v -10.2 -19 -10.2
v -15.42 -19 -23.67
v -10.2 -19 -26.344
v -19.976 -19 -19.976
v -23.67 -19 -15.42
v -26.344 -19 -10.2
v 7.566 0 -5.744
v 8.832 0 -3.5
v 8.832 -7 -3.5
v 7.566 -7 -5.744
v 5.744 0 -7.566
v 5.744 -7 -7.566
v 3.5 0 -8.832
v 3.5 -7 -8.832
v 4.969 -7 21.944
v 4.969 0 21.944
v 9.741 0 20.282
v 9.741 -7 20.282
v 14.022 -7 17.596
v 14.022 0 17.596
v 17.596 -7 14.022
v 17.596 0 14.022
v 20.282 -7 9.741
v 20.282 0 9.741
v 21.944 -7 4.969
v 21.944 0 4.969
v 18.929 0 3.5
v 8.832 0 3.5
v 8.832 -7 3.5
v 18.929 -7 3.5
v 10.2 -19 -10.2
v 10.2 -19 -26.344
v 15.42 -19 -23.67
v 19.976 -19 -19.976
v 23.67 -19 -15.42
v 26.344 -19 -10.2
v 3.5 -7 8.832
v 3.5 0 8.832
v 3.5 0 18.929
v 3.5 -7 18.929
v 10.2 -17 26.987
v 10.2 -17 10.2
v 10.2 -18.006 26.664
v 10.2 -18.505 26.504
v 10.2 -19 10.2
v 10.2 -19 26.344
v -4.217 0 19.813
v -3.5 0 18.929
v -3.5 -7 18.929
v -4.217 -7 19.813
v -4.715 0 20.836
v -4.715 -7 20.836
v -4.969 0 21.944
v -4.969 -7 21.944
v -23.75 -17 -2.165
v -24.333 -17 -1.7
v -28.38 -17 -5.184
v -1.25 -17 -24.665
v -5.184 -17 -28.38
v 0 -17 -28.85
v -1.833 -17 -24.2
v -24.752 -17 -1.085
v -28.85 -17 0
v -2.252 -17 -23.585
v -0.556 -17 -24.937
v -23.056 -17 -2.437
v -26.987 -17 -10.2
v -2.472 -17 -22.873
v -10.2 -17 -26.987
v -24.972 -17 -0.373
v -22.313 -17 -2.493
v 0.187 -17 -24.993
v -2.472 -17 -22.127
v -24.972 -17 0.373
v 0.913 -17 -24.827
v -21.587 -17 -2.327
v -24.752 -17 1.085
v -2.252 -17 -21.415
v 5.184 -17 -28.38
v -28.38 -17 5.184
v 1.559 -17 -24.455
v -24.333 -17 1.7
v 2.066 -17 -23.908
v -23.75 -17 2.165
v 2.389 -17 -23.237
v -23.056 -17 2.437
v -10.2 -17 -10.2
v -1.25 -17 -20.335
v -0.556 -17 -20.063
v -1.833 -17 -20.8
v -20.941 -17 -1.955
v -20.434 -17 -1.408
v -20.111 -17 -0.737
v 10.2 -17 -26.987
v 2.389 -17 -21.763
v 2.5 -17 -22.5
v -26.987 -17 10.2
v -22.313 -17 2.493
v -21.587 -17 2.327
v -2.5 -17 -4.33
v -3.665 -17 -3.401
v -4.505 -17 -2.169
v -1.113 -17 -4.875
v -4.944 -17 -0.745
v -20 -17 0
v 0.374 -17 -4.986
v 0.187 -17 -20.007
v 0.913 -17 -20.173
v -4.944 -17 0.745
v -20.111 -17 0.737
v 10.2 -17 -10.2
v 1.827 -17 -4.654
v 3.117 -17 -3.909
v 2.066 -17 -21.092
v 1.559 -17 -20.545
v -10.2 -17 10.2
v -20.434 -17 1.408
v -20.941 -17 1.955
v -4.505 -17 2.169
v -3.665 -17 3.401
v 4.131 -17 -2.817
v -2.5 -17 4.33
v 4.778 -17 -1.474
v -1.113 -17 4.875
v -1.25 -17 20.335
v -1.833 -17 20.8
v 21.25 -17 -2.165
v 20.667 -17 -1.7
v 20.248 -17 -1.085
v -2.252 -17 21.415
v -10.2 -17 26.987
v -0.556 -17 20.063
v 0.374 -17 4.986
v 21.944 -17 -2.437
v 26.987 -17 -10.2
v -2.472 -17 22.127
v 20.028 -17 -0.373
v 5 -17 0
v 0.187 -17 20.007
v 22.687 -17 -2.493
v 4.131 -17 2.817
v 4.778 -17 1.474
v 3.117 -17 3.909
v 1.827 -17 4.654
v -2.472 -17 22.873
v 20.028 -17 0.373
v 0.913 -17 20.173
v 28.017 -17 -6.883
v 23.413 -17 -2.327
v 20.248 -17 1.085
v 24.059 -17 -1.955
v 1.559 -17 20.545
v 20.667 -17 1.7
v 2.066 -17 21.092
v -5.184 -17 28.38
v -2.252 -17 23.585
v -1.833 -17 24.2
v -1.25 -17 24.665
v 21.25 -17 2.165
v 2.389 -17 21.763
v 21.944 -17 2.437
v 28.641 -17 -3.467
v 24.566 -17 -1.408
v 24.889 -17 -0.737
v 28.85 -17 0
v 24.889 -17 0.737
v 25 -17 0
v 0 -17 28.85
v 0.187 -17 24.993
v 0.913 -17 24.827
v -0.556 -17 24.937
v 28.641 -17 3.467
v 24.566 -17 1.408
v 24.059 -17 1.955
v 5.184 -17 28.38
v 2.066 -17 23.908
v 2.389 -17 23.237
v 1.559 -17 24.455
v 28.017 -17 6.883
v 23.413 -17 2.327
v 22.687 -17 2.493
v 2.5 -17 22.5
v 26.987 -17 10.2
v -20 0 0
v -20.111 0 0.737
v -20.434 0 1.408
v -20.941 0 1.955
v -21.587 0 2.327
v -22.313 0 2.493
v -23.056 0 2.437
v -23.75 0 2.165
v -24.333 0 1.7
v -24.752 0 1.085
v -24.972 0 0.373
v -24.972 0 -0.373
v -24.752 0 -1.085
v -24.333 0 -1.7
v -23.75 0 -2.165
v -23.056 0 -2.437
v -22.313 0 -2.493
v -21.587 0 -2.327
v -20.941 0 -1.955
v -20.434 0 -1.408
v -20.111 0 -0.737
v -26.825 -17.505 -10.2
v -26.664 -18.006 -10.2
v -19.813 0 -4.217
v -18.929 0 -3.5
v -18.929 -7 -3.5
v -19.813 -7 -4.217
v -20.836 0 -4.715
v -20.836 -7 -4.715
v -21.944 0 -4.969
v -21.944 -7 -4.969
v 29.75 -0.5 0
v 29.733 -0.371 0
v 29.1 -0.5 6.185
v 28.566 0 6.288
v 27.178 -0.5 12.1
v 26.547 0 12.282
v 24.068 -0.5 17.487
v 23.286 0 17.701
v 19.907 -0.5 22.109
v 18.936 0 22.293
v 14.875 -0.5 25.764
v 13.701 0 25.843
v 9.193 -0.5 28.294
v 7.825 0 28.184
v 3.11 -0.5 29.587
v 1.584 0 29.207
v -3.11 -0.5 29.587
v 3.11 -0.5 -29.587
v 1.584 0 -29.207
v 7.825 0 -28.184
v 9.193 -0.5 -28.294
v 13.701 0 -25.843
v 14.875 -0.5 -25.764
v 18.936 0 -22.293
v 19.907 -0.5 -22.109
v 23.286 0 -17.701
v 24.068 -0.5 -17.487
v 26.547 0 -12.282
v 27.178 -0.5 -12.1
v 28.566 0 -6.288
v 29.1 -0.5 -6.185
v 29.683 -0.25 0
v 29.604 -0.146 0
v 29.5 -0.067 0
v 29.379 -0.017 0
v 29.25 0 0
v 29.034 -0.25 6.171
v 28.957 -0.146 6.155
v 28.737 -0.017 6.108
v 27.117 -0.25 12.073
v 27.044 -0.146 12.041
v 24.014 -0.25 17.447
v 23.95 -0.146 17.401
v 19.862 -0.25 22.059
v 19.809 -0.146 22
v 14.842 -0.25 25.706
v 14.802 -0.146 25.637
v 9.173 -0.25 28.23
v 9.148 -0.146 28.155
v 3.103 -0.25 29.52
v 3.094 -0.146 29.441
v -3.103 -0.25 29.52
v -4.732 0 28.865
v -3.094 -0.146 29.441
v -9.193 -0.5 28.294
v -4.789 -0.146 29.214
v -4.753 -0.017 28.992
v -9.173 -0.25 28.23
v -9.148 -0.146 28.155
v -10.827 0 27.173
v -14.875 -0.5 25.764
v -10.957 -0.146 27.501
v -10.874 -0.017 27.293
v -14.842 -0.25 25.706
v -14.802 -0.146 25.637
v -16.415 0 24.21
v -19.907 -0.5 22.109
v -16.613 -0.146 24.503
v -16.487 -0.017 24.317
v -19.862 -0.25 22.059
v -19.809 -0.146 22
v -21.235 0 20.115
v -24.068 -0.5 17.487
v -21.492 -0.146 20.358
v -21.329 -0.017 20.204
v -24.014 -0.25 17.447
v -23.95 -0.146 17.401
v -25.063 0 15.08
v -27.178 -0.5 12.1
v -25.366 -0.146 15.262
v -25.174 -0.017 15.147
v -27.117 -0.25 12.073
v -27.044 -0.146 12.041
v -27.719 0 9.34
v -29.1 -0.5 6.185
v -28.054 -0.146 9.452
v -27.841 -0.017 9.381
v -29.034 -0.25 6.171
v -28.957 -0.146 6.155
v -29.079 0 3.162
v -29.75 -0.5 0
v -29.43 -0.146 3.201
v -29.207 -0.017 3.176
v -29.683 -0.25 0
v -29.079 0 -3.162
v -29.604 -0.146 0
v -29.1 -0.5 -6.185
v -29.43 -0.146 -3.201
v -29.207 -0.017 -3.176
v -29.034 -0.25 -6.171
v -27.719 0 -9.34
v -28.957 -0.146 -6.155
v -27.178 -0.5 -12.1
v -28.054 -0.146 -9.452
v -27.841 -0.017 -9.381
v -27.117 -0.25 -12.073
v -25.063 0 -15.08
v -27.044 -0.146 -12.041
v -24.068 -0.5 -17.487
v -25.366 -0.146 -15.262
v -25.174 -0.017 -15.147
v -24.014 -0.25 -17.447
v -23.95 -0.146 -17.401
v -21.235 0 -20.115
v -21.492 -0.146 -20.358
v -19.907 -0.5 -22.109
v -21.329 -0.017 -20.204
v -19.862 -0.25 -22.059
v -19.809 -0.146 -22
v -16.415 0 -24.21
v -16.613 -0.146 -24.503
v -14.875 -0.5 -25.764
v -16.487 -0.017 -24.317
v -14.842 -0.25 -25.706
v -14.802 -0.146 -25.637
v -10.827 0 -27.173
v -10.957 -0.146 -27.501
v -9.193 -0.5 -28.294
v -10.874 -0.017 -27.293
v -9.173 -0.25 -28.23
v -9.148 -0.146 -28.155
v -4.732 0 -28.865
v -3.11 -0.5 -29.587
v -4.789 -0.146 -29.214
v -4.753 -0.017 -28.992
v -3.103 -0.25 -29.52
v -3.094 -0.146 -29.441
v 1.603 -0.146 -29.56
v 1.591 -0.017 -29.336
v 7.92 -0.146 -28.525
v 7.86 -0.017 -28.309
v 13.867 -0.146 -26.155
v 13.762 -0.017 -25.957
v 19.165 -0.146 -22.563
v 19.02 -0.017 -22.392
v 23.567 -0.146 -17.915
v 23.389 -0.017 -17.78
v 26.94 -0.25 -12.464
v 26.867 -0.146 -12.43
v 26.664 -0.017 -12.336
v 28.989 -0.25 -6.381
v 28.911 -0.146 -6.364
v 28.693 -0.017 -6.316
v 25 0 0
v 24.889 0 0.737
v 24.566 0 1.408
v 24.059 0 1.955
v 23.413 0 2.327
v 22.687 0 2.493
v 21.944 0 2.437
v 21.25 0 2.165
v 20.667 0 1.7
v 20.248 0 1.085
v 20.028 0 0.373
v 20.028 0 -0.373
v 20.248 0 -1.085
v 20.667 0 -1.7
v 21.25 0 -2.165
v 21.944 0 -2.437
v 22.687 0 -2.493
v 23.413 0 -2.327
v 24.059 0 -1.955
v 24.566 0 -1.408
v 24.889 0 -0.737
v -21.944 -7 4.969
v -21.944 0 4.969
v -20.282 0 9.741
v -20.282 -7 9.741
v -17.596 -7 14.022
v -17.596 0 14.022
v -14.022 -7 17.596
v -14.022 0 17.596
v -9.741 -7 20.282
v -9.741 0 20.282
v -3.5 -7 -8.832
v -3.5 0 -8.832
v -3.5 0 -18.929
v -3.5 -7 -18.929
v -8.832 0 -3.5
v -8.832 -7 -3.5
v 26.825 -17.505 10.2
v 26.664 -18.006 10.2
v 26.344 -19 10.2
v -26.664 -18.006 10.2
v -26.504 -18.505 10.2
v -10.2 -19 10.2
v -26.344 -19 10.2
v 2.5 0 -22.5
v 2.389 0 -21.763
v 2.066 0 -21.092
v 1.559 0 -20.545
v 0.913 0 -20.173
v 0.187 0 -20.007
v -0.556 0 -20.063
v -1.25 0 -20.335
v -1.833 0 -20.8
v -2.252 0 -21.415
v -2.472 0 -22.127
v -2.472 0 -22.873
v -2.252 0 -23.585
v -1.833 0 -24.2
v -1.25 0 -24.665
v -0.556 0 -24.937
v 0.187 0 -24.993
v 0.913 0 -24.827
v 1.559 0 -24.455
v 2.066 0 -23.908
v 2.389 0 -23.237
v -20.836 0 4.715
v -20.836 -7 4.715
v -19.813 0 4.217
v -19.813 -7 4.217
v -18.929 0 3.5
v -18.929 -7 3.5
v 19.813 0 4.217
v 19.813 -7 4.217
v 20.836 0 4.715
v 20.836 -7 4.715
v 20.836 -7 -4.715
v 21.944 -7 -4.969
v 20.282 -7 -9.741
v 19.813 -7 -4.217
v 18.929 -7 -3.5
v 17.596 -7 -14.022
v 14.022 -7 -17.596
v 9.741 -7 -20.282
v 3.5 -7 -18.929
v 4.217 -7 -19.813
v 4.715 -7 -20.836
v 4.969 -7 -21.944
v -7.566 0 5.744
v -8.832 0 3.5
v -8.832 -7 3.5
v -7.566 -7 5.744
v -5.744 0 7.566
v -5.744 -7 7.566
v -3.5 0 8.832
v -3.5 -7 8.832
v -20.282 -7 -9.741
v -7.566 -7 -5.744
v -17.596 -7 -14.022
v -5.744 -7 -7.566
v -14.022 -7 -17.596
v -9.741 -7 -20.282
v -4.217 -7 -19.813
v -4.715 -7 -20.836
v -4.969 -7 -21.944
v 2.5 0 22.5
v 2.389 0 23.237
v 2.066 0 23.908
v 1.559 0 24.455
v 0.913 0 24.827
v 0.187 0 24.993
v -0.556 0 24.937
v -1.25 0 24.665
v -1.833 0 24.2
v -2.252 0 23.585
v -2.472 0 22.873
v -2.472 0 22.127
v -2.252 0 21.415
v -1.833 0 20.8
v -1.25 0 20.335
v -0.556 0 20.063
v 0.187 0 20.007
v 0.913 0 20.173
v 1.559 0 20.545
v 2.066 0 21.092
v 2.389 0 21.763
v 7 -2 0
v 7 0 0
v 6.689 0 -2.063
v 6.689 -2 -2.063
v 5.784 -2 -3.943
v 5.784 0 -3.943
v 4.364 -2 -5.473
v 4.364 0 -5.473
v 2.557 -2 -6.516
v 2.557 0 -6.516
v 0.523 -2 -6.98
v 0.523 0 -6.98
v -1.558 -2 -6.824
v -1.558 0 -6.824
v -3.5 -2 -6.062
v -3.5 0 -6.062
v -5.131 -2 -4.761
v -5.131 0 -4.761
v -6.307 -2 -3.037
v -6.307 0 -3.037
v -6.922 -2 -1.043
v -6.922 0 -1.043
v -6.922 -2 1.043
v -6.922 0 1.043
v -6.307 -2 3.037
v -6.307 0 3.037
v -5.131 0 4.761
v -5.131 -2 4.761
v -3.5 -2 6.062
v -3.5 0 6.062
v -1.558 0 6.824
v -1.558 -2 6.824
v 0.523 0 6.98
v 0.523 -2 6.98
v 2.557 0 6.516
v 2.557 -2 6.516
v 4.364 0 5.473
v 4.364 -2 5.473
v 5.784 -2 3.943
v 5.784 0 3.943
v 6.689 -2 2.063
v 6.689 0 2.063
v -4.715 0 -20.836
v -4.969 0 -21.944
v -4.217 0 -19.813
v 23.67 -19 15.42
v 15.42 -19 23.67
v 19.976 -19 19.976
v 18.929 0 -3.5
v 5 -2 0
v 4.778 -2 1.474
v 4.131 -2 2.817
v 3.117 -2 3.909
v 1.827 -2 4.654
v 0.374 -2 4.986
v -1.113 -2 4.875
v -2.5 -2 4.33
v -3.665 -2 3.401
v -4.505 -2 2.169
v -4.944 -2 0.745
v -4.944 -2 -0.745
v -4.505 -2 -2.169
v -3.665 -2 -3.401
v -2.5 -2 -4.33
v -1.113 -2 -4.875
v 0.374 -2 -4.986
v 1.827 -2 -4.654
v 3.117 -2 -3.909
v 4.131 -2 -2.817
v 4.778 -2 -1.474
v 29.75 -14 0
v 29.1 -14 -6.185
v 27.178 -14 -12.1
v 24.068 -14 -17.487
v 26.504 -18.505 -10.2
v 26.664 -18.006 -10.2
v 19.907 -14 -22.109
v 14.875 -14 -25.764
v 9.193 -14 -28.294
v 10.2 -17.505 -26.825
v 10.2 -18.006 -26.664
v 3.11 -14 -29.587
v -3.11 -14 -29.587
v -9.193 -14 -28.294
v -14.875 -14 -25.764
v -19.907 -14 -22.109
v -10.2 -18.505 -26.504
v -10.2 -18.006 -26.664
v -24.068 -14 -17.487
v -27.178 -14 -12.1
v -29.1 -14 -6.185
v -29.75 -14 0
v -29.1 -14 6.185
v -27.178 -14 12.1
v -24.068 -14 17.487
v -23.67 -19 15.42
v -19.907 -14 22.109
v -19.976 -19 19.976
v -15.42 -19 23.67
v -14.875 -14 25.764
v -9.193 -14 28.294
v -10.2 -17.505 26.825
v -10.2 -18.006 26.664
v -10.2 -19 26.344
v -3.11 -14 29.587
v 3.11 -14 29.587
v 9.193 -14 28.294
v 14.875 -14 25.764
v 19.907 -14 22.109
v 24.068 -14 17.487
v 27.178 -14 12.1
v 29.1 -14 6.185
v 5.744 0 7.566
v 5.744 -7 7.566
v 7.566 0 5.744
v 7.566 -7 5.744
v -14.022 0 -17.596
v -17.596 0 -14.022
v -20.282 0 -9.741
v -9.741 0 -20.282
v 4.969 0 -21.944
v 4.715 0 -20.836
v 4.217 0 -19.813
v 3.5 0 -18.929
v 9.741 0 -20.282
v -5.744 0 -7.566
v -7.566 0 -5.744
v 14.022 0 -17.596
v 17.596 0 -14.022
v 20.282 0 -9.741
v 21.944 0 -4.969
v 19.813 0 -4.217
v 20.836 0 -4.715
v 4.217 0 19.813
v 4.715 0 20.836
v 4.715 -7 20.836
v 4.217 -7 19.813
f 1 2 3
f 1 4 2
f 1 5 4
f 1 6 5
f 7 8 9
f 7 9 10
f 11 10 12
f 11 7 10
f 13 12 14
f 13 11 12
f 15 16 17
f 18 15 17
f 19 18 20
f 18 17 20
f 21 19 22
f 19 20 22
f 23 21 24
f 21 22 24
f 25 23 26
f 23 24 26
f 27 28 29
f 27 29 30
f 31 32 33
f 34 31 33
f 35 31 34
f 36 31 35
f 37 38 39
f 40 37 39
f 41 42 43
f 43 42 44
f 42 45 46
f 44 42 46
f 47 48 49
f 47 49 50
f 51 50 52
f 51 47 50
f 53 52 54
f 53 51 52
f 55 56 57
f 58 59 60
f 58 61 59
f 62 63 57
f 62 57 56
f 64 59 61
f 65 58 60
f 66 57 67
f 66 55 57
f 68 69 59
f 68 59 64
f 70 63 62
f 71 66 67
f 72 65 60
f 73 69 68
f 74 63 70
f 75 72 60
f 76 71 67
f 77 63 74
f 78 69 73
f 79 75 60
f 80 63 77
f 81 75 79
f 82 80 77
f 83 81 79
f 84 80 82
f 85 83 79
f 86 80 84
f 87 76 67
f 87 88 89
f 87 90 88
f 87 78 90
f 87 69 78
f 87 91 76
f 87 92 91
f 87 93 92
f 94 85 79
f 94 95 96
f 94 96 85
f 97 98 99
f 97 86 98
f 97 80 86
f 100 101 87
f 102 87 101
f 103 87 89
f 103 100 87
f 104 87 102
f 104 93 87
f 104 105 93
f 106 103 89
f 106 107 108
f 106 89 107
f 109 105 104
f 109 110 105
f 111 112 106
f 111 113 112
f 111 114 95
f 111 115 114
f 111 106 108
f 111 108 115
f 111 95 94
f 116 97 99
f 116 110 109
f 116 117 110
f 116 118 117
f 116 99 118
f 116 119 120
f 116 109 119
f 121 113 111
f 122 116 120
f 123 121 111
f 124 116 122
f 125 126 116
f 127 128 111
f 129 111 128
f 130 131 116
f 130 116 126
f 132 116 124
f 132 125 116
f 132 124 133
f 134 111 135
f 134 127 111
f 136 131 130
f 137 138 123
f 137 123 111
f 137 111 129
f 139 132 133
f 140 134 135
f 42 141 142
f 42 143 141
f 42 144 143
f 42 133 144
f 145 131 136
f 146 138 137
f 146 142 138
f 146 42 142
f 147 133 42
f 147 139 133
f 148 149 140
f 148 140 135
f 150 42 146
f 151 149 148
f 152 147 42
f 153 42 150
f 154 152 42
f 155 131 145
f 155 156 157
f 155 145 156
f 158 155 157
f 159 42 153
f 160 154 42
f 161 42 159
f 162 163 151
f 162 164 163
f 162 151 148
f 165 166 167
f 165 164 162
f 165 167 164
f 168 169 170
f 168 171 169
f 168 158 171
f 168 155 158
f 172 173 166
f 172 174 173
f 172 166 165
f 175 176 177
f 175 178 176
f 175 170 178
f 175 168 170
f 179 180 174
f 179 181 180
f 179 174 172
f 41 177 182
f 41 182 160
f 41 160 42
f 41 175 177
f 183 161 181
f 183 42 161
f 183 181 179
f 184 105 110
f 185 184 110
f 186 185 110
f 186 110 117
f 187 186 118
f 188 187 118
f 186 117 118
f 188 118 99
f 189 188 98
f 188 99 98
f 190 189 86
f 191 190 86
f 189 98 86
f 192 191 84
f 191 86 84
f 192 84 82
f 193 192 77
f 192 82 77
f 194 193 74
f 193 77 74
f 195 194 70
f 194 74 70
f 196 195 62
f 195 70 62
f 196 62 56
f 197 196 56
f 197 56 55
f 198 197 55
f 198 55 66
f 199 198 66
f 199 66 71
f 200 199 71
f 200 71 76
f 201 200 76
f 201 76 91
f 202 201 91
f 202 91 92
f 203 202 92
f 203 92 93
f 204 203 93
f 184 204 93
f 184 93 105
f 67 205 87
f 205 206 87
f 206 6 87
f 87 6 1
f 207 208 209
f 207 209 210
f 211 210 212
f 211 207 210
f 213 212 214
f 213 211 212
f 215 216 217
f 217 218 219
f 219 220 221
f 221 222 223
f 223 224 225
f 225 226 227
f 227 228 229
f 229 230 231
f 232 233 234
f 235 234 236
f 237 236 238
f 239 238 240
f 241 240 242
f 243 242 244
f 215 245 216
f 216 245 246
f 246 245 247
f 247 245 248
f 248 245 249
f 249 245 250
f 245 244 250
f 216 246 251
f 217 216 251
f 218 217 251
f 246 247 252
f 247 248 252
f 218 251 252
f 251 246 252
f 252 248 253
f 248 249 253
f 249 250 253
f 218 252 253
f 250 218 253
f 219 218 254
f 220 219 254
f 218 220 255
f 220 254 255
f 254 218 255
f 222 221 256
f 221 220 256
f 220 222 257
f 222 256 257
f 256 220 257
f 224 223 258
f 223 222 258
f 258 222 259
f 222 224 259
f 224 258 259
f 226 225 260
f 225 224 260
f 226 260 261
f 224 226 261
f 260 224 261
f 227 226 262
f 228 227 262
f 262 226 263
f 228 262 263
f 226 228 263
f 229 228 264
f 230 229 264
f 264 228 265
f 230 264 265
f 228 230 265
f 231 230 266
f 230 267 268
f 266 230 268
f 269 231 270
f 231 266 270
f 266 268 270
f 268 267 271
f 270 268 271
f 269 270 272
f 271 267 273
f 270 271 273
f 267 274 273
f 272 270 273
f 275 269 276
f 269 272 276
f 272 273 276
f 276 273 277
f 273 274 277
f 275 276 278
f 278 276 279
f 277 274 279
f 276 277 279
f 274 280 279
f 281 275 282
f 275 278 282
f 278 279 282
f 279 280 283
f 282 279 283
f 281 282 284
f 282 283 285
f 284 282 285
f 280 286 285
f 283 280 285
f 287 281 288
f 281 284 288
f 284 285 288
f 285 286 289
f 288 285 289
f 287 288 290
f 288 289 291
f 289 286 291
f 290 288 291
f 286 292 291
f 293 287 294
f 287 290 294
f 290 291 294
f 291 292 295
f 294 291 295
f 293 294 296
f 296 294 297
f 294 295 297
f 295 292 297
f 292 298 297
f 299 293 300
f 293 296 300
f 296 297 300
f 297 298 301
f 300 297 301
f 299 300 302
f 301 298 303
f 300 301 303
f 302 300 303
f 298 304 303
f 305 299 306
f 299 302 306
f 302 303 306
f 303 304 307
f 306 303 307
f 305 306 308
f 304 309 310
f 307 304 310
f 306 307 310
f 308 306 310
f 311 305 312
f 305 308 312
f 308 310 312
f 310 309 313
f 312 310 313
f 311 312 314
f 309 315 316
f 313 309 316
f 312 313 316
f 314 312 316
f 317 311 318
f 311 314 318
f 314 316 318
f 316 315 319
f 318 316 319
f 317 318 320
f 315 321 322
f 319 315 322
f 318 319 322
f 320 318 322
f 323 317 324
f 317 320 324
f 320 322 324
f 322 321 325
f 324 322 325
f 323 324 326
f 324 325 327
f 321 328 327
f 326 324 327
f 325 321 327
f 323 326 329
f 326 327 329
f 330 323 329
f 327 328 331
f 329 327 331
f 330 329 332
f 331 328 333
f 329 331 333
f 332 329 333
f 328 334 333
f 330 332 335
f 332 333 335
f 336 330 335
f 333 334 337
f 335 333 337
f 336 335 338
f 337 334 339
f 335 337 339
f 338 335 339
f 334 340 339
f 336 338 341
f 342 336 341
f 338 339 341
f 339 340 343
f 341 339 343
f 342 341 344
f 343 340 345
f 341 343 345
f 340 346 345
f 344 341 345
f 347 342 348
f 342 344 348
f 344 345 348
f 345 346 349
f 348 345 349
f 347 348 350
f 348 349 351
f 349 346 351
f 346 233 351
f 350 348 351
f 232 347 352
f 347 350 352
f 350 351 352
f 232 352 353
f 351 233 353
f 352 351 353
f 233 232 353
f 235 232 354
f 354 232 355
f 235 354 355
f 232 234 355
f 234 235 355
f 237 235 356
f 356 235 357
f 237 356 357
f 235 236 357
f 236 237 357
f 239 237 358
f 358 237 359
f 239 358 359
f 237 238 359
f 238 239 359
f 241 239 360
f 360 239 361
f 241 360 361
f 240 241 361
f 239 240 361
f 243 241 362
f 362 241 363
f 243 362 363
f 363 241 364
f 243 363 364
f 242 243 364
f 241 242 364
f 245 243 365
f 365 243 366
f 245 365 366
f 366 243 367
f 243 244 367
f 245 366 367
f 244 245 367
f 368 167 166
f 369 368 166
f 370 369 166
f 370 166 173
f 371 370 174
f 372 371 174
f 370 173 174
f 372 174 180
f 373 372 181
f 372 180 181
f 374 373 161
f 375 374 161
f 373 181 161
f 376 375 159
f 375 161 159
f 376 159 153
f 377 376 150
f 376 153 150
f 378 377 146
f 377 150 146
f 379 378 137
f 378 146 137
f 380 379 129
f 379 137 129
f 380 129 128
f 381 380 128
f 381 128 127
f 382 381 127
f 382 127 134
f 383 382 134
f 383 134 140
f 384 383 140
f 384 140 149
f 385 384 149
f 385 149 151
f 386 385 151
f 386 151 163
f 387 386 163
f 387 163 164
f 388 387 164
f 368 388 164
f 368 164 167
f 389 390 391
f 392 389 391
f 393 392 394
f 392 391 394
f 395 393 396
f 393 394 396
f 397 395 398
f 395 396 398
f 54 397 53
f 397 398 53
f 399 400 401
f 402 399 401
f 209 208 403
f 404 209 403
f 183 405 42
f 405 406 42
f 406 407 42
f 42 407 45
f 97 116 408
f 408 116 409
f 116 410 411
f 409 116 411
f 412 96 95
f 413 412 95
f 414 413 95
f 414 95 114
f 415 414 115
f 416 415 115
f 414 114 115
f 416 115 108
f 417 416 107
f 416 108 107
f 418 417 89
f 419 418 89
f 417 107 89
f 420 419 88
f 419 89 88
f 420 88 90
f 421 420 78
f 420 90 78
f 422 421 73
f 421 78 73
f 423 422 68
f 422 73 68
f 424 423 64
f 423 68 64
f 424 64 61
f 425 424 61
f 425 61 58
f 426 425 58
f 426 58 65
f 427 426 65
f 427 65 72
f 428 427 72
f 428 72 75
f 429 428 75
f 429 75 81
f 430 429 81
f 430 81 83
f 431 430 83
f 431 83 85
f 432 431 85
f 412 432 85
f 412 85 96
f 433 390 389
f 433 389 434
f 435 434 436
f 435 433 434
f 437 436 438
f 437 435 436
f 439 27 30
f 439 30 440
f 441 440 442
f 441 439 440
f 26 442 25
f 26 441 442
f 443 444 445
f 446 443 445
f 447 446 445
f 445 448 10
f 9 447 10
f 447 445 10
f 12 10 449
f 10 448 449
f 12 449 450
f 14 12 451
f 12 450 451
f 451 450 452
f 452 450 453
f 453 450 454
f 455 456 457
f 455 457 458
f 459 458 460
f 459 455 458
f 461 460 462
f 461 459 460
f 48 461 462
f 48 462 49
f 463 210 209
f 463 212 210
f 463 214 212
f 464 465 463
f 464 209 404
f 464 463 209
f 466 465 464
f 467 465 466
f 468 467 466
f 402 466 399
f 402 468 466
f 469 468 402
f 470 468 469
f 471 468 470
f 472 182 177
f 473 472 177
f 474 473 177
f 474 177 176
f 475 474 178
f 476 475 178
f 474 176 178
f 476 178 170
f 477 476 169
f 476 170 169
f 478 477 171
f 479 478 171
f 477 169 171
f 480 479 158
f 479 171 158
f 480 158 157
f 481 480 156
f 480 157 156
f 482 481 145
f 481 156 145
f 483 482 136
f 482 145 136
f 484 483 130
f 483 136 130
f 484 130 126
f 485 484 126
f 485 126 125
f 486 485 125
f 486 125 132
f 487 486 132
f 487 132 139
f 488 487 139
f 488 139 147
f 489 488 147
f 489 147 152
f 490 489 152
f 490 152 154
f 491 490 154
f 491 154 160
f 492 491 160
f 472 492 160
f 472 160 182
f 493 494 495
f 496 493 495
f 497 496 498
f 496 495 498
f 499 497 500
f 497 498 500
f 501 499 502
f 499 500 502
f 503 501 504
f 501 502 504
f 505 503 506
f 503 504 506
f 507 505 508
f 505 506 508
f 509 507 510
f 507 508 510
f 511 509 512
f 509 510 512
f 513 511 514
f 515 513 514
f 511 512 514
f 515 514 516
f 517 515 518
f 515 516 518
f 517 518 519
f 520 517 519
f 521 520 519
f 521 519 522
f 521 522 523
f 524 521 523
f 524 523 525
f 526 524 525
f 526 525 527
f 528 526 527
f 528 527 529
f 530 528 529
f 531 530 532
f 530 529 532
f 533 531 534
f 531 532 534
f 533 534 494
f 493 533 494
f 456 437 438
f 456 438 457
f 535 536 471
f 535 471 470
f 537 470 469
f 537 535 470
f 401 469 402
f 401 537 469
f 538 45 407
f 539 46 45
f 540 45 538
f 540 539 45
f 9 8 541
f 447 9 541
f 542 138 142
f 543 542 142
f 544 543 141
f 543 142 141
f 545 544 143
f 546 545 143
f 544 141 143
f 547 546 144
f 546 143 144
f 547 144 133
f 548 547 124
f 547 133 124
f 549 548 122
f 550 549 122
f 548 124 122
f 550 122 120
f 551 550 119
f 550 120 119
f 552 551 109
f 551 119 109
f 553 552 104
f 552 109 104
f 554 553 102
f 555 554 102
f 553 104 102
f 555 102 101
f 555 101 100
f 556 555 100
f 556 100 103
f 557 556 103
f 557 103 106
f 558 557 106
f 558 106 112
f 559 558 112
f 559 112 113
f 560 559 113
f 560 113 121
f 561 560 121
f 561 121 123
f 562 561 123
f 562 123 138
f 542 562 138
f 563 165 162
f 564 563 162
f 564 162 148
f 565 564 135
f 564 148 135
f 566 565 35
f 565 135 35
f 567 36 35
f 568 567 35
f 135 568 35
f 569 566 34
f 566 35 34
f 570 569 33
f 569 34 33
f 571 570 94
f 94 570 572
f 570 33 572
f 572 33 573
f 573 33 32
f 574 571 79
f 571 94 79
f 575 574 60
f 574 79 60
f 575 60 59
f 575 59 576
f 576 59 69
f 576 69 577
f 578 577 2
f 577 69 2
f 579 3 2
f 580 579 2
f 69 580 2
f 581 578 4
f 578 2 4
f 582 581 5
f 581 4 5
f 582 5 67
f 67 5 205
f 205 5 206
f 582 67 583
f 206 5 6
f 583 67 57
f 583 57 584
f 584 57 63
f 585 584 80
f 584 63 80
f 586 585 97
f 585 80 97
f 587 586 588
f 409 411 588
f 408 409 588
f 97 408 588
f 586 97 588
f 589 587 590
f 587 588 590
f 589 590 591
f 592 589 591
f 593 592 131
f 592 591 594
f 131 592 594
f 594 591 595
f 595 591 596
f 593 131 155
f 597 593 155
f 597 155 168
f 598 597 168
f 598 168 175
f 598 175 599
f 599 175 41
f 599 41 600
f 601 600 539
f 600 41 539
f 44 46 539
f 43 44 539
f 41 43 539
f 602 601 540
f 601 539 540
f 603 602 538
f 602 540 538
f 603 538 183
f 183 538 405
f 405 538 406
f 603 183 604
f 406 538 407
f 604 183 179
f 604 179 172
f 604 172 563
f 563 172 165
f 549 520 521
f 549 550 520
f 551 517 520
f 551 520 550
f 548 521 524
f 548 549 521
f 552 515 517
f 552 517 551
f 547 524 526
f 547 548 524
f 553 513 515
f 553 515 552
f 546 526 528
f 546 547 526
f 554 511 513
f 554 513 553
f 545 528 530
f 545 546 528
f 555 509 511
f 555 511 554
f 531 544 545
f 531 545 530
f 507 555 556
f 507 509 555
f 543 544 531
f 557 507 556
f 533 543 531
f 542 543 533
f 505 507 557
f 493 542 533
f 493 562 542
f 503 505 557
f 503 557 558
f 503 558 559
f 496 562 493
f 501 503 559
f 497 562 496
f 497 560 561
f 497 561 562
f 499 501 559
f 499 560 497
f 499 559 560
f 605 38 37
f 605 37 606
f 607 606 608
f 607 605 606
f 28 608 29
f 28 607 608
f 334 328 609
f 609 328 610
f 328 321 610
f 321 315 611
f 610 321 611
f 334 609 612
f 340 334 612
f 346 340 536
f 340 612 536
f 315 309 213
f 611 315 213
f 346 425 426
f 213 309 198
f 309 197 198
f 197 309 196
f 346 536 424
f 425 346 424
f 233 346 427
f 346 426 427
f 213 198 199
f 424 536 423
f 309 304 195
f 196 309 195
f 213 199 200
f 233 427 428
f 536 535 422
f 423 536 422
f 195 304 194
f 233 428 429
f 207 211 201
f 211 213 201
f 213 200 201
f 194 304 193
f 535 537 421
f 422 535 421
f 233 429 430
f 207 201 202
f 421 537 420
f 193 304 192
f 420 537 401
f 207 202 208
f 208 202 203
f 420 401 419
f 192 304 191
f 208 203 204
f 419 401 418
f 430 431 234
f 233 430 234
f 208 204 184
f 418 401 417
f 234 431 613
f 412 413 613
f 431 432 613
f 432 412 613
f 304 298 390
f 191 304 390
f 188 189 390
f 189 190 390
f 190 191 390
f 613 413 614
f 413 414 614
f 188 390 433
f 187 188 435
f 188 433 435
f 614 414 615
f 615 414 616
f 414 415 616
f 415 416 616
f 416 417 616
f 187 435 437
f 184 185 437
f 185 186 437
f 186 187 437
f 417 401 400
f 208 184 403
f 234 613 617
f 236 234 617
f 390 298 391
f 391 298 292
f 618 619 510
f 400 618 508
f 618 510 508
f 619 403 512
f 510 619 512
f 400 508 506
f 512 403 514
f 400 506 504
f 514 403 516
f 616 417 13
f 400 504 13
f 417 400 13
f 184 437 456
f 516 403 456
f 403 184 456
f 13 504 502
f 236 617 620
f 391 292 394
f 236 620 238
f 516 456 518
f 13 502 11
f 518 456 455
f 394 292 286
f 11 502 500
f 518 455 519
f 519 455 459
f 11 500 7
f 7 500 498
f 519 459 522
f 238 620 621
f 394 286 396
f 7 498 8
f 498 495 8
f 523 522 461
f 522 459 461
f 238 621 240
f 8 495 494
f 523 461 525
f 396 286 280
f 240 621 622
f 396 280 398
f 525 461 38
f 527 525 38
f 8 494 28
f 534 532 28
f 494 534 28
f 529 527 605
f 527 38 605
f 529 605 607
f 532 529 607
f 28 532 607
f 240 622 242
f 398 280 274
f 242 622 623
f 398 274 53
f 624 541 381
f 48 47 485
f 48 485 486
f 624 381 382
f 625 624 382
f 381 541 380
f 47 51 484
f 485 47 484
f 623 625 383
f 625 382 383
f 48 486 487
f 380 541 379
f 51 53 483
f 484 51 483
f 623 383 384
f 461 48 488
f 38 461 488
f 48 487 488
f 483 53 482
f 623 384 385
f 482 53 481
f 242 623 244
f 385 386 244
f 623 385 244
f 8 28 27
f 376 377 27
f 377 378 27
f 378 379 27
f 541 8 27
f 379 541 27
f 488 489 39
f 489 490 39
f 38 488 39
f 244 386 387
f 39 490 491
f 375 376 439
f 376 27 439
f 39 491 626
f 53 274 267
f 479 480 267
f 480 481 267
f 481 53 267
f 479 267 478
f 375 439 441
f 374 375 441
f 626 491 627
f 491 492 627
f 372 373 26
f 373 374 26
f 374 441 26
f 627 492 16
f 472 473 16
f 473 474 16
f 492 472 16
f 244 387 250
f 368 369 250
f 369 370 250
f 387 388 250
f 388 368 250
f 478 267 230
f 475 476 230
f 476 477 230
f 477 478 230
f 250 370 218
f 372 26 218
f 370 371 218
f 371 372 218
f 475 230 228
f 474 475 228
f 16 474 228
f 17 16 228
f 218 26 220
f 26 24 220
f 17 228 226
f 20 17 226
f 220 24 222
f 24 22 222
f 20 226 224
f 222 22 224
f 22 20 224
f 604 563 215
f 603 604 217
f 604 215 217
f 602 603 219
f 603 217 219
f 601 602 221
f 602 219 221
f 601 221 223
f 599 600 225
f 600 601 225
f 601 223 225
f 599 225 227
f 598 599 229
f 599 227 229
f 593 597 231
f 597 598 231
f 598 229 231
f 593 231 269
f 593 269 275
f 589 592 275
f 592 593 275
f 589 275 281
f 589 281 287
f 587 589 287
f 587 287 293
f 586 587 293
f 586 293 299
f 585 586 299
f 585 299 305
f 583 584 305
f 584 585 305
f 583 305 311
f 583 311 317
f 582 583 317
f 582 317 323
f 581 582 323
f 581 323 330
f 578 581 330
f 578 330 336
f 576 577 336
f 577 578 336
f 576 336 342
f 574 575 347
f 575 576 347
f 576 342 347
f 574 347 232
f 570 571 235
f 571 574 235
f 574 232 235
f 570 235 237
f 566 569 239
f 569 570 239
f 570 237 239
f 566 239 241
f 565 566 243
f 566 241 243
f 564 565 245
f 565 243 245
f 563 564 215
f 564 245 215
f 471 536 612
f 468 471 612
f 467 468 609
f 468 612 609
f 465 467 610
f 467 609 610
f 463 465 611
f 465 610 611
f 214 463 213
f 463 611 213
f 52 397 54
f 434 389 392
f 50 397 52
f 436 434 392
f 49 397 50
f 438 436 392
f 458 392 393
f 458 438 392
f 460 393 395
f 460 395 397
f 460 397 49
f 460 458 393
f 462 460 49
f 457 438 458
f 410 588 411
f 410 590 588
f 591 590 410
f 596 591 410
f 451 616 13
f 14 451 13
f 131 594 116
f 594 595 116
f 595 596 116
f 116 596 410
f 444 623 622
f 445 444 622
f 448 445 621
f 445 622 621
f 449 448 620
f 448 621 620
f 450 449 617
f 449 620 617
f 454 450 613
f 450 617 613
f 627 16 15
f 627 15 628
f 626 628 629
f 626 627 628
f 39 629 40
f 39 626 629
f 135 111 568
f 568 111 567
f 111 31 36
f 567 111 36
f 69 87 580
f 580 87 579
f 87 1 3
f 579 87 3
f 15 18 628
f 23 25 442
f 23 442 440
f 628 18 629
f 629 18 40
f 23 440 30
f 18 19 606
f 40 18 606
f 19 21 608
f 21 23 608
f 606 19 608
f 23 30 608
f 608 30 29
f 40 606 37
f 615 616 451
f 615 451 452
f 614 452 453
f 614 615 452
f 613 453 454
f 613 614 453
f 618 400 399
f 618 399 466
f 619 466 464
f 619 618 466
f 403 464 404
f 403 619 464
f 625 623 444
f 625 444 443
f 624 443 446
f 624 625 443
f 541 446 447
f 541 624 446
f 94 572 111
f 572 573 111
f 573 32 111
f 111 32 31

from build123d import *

# Parameters (mm, degrees)
SKETCH_R        = 29.75
PAD_DEPTH       = 19
POCKET_DEPTH    = 2
SKETCH002_R     = 5
HOLE_DEPTH      = 17.001
SKETCH003_R     = 2.5
HOLE001_DEPTH   = 17.001
POCKET001_DEPTH = 7
SKETCH005_R     = 7
POCKET002_DEPTH = 2
FILLET_R        = 0.5


with BuildPart() as part:
    # Sketch → Pad (new body)
    with BuildSketch(Plane.XZ):
        Circle(SKETCH_R)
    extrude(amount=PAD_DEPTH)

    # Sketch001 (on Face3 of Pad) → Pocket (cut)
    with BuildSketch(Plane.XZ.offset(19)):
        Polygon((-10.2, 27.94678), (-10.2, 10.2), (-27.94678, 10.2), (-38.800591, 2.809986), (-27.94678, -10.2), (-10.2, -10.2), (-10.2, -27.94678), (0.437611, -41.292454), (10.2, -27.94678), (10.2, -10.2), (27.94678, -10.2), (40.756752, -1.838068), (27.94678, 10.2), (10.2, 10.2), (10.2, 27.94678), (-0.319049, 40.318684), align=None)
    extrude(amount=-POCKET_DEPTH, mode=Mode.SUBTRACT)

    # Sketch002 (on Face3 of Pocket) → Hole (cut, through all)
    with BuildSketch(Plane.XZ.offset(17)):
        Circle(SKETCH002_R)
    extrude(amount=-HOLE_DEPTH, mode=Mode.SUBTRACT)

    # Sketch003 (on Face3 of Hole) → Hole001 (cut, through all)
    with BuildSketch(Plane.XZ.offset(17)):
        with Locations((0, 22.5)):
            Circle(SKETCH003_R)
        with Locations((22.5, 0)):
            Circle(SKETCH003_R)
        with Locations((0, -22.5)):
            Circle(SKETCH003_R)
        with Locations((-22.5, 0)):
            Circle(SKETCH003_R)
    extrude(amount=-HOLE001_DEPTH, mode=Mode.SUBTRACT)

    # Sketch004 (on Face2 of Hole001) → Pocket001 (cut)
    with BuildSketch(Plane(origin=(0, 0, 0), x_dir=(1, 0, 0), z_dir=(0, 1, 0))):
        with BuildLine():
            ThreePointArc((-21.944444, -4.96904), (-15.909903, -15.909903), (-4.96904, -21.944444))
            ThreePointArc((-3.5, -18.929286), (-4.494881, -20.310013), (-4.96904, -21.944444))
            Line((-3.5, -8.831761), (-3.5, -18.929286))
            ThreePointArc((-8.831761, -3.5), (-6.717514, -6.717514), (-3.5, -8.831761))
            Line((-18.929286, -3.5), (-8.831761, -3.5))
            ThreePointArc((-21.944444, -4.96904), (-20.310013, -4.494881), (-18.929286, -3.5))
        make_face()
        with BuildLine():
            ThreePointArc((8.831761, 3.5), (6.717514, 6.717514), (3.5, 8.831761))
            Line((3.5, 18.929286), (3.5, 8.831761))
            ThreePointArc((3.5, 18.929286), (4.494881, 20.310013), (4.96904, 21.944444))
            ThreePointArc((21.944444, 4.96904), (15.909903, 15.909903), (4.96904, 21.944444))
            ThreePointArc((21.944444, 4.96904), (20.310013, 4.494881), (18.929286, 3.5))
            Line((8.831761, 3.5), (18.929286, 3.5))
        make_face()
        with BuildLine():
            ThreePointArc((18.929286, -3.5), (20.310013, -4.494881), (21.944444, -4.96904))
            ThreePointArc((4.96904, -21.944444), (15.909903, -15.909903), (21.944444, -4.96904))
            ThreePointArc((4.96904, -21.944444), (4.494881, -20.310013), (3.5, -18.929286))
            Line((3.5, -8.831761), (3.5, -18.929286))
            ThreePointArc((3.5, -8.831761), (6.717514, -6.717514), (8.831761, -3.5))
            Line((8.831761, -3.5), (18.929286, -3.5))
        make_face()
        with BuildLine():
            Line((-3.5, 8.831761), (-3.5, 18.929286))
            ThreePointArc((-4.96904, 21.944444), (-4.494881, 20.310013), (-3.5, 18.929286))
            ThreePointArc((-4.96904, 21.944444), (-15.909903, 15.909903), (-21.944444, 4.96904))
            ThreePointArc((-18.929286, 3.5), (-20.310013, 4.494881), (-21.944444, 4.96904))
            Line((-18.929286, 3.5), (-8.831761, 3.5))
            ThreePointArc((-3.5, 8.831761), (-6.717514, 6.717514), (-8.831761, 3.5))
        make_face()
    extrude(amount=-POCKET001_DEPTH, mode=Mode.SUBTRACT)

    # Sketch005 (on Face2 of Pocket001) → Pocket002 (cut)
    with BuildSketch(Plane(origin=(0, 0, 0), x_dir=(1, 0, 0), z_dir=(0, 1, 0))):
        Circle(SKETCH005_R)
    extrude(amount=-POCKET002_DEPTH, mode=Mode.SUBTRACT)

    # Sketch006 (on DatumPlane) → Groove (revolve, cut)
    with BuildSketch(Plane(origin=(29.75, 0, 0), x_dir=(-1, 0, 0), z_dir=(0, 0, -1))):
        Polygon((0, -14), (1.5, -19), (0, -19), align=None)
    revolve(axis=Axis((0, 0, 0), (0, 1, 0)), mode=Mode.SUBTRACT)

    # Fillet
    fillet_edges = [part.edges().sort_by_distance(p)[0] for p in [
        (-29.75, 0, 0),
    ]]
    fillet(fillet_edges, radius=FILLET_R)


solid = part.part
